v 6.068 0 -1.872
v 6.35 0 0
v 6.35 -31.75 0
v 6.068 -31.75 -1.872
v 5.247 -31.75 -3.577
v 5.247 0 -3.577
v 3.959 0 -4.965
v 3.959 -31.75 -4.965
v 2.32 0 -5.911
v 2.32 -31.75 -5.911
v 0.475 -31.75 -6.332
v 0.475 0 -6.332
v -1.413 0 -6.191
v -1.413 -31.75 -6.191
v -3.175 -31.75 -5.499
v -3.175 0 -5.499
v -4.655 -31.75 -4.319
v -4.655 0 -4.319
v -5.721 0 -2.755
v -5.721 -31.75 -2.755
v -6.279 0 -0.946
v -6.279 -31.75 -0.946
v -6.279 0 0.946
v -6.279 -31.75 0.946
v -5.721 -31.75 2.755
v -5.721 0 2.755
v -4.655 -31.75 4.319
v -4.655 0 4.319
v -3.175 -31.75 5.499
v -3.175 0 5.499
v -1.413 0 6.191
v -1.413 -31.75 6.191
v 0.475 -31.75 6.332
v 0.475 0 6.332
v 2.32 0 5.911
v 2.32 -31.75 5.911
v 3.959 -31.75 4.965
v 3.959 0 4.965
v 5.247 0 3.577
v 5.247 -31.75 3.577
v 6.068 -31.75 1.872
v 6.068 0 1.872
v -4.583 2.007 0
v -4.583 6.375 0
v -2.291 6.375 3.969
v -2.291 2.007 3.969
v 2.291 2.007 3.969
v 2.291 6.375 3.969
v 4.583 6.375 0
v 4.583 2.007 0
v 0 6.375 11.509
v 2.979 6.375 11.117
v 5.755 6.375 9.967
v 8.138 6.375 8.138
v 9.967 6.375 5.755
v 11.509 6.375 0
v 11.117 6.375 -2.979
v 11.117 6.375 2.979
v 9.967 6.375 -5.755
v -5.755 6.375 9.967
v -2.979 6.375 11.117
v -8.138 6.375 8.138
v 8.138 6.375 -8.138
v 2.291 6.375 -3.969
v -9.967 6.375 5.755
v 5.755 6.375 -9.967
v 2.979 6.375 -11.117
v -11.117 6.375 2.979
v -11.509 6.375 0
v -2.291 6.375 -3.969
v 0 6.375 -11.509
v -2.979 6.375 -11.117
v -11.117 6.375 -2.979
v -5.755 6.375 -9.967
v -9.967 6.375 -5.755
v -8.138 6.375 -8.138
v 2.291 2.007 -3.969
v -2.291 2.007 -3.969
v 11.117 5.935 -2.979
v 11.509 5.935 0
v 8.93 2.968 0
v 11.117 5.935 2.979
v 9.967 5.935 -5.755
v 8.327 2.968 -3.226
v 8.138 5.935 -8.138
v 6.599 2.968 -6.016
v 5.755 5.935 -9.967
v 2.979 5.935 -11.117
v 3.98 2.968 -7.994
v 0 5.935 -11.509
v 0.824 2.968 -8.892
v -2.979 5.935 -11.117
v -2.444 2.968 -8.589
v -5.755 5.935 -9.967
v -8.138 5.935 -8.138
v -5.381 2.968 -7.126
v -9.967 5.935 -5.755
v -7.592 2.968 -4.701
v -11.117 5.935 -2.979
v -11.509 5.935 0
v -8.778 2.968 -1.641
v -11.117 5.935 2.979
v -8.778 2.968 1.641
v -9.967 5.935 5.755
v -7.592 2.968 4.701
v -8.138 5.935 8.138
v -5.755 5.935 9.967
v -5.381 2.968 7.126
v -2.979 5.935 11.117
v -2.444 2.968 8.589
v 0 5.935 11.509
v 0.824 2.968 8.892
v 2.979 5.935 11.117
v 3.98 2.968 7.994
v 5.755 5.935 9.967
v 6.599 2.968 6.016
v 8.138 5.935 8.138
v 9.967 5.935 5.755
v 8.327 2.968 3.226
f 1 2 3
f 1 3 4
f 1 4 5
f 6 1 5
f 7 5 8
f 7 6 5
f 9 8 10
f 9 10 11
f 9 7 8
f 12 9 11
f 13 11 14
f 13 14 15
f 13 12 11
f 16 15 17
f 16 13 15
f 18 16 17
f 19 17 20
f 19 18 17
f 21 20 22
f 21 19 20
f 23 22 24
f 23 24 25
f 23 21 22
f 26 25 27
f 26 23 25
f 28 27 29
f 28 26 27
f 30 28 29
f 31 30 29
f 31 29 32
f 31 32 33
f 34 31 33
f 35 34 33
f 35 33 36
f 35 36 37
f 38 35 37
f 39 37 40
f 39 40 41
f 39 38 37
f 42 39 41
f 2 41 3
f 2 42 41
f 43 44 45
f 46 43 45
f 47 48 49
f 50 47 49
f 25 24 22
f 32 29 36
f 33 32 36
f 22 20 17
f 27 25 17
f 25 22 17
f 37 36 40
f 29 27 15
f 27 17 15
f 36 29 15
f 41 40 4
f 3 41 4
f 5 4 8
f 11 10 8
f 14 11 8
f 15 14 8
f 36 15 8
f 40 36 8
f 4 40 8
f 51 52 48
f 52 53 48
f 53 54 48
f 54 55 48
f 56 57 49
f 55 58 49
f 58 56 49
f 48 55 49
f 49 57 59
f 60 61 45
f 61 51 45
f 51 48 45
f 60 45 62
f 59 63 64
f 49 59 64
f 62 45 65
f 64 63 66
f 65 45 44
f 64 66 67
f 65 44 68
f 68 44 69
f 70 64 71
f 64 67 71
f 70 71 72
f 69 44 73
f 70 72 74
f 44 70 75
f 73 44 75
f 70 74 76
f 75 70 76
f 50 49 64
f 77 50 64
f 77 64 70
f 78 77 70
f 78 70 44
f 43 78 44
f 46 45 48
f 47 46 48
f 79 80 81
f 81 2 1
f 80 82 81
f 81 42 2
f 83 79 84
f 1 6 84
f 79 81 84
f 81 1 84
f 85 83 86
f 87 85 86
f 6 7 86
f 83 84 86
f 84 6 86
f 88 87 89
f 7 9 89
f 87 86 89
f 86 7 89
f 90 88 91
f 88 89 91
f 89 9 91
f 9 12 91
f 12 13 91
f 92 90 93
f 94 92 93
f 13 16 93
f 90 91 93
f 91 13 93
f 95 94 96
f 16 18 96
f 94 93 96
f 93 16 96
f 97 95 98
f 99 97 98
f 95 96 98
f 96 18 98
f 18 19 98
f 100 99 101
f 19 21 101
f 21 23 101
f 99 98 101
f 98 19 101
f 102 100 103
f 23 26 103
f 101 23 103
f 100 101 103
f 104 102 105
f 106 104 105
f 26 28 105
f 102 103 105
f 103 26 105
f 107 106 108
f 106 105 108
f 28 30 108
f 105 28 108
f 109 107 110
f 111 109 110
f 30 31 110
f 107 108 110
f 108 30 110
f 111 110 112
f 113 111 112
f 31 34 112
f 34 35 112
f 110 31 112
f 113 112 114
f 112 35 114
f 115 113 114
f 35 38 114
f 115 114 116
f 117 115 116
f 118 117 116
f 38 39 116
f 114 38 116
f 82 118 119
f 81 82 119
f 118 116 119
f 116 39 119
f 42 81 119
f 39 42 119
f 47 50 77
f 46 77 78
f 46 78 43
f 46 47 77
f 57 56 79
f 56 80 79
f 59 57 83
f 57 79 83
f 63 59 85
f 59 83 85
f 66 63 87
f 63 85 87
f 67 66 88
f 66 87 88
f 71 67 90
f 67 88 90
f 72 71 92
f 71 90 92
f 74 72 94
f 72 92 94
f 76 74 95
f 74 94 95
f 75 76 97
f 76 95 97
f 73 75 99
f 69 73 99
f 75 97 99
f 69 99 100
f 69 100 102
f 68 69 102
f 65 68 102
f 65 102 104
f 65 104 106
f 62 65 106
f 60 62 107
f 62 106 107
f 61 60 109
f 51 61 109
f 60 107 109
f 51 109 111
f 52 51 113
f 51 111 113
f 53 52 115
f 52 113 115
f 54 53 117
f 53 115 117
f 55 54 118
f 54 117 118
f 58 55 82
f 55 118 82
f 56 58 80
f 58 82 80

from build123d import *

# Parameters (mm, degrees)
SKETCH2_R          = 6.35
LENGTH_DEPTH       = 31.75
CUT_EXTRUDE1_DEPTH = 4.3688


with BuildPart() as part:
    # Sketch1 → Head (revolve)
    with BuildSketch(Plane.XY):
        Polygon((0, 6.3754), (11.509375, 6.3754), (11.509375, 5.935182001), (6.35, 0), (0, 0), align=None)
    revolve(axis=Axis((0, -1.82358767, 0), (0, 1, 0)))

    # Sketch2 → Length (add)
    with BuildSketch(Plane(origin=(0, 0, 0), x_dir=(1, 0, 0), z_dir=(0, 1, 0))):
        Circle(SKETCH2_R)
    extrude(amount=-LENGTH_DEPTH)

    # Sketch3 → Cut-Extrude1 (cut)
    with BuildSketch(Plane(origin=(0, 6.3754, 0), x_dir=(-1, 0, 0), z_dir=(0, 1, 0))):
        Polygon((2.291358881, 3.96875), (-2.291358881, 3.96875), (-4.582717762, 0), (-2.291358881, -3.96875), (2.291358881, -3.96875), (4.582717762, 0), align=None)
    extrude(amount=-CUT_EXTRUDE1_DEPTH, mode=Mode.SUBTRACT)


solid = part.part
